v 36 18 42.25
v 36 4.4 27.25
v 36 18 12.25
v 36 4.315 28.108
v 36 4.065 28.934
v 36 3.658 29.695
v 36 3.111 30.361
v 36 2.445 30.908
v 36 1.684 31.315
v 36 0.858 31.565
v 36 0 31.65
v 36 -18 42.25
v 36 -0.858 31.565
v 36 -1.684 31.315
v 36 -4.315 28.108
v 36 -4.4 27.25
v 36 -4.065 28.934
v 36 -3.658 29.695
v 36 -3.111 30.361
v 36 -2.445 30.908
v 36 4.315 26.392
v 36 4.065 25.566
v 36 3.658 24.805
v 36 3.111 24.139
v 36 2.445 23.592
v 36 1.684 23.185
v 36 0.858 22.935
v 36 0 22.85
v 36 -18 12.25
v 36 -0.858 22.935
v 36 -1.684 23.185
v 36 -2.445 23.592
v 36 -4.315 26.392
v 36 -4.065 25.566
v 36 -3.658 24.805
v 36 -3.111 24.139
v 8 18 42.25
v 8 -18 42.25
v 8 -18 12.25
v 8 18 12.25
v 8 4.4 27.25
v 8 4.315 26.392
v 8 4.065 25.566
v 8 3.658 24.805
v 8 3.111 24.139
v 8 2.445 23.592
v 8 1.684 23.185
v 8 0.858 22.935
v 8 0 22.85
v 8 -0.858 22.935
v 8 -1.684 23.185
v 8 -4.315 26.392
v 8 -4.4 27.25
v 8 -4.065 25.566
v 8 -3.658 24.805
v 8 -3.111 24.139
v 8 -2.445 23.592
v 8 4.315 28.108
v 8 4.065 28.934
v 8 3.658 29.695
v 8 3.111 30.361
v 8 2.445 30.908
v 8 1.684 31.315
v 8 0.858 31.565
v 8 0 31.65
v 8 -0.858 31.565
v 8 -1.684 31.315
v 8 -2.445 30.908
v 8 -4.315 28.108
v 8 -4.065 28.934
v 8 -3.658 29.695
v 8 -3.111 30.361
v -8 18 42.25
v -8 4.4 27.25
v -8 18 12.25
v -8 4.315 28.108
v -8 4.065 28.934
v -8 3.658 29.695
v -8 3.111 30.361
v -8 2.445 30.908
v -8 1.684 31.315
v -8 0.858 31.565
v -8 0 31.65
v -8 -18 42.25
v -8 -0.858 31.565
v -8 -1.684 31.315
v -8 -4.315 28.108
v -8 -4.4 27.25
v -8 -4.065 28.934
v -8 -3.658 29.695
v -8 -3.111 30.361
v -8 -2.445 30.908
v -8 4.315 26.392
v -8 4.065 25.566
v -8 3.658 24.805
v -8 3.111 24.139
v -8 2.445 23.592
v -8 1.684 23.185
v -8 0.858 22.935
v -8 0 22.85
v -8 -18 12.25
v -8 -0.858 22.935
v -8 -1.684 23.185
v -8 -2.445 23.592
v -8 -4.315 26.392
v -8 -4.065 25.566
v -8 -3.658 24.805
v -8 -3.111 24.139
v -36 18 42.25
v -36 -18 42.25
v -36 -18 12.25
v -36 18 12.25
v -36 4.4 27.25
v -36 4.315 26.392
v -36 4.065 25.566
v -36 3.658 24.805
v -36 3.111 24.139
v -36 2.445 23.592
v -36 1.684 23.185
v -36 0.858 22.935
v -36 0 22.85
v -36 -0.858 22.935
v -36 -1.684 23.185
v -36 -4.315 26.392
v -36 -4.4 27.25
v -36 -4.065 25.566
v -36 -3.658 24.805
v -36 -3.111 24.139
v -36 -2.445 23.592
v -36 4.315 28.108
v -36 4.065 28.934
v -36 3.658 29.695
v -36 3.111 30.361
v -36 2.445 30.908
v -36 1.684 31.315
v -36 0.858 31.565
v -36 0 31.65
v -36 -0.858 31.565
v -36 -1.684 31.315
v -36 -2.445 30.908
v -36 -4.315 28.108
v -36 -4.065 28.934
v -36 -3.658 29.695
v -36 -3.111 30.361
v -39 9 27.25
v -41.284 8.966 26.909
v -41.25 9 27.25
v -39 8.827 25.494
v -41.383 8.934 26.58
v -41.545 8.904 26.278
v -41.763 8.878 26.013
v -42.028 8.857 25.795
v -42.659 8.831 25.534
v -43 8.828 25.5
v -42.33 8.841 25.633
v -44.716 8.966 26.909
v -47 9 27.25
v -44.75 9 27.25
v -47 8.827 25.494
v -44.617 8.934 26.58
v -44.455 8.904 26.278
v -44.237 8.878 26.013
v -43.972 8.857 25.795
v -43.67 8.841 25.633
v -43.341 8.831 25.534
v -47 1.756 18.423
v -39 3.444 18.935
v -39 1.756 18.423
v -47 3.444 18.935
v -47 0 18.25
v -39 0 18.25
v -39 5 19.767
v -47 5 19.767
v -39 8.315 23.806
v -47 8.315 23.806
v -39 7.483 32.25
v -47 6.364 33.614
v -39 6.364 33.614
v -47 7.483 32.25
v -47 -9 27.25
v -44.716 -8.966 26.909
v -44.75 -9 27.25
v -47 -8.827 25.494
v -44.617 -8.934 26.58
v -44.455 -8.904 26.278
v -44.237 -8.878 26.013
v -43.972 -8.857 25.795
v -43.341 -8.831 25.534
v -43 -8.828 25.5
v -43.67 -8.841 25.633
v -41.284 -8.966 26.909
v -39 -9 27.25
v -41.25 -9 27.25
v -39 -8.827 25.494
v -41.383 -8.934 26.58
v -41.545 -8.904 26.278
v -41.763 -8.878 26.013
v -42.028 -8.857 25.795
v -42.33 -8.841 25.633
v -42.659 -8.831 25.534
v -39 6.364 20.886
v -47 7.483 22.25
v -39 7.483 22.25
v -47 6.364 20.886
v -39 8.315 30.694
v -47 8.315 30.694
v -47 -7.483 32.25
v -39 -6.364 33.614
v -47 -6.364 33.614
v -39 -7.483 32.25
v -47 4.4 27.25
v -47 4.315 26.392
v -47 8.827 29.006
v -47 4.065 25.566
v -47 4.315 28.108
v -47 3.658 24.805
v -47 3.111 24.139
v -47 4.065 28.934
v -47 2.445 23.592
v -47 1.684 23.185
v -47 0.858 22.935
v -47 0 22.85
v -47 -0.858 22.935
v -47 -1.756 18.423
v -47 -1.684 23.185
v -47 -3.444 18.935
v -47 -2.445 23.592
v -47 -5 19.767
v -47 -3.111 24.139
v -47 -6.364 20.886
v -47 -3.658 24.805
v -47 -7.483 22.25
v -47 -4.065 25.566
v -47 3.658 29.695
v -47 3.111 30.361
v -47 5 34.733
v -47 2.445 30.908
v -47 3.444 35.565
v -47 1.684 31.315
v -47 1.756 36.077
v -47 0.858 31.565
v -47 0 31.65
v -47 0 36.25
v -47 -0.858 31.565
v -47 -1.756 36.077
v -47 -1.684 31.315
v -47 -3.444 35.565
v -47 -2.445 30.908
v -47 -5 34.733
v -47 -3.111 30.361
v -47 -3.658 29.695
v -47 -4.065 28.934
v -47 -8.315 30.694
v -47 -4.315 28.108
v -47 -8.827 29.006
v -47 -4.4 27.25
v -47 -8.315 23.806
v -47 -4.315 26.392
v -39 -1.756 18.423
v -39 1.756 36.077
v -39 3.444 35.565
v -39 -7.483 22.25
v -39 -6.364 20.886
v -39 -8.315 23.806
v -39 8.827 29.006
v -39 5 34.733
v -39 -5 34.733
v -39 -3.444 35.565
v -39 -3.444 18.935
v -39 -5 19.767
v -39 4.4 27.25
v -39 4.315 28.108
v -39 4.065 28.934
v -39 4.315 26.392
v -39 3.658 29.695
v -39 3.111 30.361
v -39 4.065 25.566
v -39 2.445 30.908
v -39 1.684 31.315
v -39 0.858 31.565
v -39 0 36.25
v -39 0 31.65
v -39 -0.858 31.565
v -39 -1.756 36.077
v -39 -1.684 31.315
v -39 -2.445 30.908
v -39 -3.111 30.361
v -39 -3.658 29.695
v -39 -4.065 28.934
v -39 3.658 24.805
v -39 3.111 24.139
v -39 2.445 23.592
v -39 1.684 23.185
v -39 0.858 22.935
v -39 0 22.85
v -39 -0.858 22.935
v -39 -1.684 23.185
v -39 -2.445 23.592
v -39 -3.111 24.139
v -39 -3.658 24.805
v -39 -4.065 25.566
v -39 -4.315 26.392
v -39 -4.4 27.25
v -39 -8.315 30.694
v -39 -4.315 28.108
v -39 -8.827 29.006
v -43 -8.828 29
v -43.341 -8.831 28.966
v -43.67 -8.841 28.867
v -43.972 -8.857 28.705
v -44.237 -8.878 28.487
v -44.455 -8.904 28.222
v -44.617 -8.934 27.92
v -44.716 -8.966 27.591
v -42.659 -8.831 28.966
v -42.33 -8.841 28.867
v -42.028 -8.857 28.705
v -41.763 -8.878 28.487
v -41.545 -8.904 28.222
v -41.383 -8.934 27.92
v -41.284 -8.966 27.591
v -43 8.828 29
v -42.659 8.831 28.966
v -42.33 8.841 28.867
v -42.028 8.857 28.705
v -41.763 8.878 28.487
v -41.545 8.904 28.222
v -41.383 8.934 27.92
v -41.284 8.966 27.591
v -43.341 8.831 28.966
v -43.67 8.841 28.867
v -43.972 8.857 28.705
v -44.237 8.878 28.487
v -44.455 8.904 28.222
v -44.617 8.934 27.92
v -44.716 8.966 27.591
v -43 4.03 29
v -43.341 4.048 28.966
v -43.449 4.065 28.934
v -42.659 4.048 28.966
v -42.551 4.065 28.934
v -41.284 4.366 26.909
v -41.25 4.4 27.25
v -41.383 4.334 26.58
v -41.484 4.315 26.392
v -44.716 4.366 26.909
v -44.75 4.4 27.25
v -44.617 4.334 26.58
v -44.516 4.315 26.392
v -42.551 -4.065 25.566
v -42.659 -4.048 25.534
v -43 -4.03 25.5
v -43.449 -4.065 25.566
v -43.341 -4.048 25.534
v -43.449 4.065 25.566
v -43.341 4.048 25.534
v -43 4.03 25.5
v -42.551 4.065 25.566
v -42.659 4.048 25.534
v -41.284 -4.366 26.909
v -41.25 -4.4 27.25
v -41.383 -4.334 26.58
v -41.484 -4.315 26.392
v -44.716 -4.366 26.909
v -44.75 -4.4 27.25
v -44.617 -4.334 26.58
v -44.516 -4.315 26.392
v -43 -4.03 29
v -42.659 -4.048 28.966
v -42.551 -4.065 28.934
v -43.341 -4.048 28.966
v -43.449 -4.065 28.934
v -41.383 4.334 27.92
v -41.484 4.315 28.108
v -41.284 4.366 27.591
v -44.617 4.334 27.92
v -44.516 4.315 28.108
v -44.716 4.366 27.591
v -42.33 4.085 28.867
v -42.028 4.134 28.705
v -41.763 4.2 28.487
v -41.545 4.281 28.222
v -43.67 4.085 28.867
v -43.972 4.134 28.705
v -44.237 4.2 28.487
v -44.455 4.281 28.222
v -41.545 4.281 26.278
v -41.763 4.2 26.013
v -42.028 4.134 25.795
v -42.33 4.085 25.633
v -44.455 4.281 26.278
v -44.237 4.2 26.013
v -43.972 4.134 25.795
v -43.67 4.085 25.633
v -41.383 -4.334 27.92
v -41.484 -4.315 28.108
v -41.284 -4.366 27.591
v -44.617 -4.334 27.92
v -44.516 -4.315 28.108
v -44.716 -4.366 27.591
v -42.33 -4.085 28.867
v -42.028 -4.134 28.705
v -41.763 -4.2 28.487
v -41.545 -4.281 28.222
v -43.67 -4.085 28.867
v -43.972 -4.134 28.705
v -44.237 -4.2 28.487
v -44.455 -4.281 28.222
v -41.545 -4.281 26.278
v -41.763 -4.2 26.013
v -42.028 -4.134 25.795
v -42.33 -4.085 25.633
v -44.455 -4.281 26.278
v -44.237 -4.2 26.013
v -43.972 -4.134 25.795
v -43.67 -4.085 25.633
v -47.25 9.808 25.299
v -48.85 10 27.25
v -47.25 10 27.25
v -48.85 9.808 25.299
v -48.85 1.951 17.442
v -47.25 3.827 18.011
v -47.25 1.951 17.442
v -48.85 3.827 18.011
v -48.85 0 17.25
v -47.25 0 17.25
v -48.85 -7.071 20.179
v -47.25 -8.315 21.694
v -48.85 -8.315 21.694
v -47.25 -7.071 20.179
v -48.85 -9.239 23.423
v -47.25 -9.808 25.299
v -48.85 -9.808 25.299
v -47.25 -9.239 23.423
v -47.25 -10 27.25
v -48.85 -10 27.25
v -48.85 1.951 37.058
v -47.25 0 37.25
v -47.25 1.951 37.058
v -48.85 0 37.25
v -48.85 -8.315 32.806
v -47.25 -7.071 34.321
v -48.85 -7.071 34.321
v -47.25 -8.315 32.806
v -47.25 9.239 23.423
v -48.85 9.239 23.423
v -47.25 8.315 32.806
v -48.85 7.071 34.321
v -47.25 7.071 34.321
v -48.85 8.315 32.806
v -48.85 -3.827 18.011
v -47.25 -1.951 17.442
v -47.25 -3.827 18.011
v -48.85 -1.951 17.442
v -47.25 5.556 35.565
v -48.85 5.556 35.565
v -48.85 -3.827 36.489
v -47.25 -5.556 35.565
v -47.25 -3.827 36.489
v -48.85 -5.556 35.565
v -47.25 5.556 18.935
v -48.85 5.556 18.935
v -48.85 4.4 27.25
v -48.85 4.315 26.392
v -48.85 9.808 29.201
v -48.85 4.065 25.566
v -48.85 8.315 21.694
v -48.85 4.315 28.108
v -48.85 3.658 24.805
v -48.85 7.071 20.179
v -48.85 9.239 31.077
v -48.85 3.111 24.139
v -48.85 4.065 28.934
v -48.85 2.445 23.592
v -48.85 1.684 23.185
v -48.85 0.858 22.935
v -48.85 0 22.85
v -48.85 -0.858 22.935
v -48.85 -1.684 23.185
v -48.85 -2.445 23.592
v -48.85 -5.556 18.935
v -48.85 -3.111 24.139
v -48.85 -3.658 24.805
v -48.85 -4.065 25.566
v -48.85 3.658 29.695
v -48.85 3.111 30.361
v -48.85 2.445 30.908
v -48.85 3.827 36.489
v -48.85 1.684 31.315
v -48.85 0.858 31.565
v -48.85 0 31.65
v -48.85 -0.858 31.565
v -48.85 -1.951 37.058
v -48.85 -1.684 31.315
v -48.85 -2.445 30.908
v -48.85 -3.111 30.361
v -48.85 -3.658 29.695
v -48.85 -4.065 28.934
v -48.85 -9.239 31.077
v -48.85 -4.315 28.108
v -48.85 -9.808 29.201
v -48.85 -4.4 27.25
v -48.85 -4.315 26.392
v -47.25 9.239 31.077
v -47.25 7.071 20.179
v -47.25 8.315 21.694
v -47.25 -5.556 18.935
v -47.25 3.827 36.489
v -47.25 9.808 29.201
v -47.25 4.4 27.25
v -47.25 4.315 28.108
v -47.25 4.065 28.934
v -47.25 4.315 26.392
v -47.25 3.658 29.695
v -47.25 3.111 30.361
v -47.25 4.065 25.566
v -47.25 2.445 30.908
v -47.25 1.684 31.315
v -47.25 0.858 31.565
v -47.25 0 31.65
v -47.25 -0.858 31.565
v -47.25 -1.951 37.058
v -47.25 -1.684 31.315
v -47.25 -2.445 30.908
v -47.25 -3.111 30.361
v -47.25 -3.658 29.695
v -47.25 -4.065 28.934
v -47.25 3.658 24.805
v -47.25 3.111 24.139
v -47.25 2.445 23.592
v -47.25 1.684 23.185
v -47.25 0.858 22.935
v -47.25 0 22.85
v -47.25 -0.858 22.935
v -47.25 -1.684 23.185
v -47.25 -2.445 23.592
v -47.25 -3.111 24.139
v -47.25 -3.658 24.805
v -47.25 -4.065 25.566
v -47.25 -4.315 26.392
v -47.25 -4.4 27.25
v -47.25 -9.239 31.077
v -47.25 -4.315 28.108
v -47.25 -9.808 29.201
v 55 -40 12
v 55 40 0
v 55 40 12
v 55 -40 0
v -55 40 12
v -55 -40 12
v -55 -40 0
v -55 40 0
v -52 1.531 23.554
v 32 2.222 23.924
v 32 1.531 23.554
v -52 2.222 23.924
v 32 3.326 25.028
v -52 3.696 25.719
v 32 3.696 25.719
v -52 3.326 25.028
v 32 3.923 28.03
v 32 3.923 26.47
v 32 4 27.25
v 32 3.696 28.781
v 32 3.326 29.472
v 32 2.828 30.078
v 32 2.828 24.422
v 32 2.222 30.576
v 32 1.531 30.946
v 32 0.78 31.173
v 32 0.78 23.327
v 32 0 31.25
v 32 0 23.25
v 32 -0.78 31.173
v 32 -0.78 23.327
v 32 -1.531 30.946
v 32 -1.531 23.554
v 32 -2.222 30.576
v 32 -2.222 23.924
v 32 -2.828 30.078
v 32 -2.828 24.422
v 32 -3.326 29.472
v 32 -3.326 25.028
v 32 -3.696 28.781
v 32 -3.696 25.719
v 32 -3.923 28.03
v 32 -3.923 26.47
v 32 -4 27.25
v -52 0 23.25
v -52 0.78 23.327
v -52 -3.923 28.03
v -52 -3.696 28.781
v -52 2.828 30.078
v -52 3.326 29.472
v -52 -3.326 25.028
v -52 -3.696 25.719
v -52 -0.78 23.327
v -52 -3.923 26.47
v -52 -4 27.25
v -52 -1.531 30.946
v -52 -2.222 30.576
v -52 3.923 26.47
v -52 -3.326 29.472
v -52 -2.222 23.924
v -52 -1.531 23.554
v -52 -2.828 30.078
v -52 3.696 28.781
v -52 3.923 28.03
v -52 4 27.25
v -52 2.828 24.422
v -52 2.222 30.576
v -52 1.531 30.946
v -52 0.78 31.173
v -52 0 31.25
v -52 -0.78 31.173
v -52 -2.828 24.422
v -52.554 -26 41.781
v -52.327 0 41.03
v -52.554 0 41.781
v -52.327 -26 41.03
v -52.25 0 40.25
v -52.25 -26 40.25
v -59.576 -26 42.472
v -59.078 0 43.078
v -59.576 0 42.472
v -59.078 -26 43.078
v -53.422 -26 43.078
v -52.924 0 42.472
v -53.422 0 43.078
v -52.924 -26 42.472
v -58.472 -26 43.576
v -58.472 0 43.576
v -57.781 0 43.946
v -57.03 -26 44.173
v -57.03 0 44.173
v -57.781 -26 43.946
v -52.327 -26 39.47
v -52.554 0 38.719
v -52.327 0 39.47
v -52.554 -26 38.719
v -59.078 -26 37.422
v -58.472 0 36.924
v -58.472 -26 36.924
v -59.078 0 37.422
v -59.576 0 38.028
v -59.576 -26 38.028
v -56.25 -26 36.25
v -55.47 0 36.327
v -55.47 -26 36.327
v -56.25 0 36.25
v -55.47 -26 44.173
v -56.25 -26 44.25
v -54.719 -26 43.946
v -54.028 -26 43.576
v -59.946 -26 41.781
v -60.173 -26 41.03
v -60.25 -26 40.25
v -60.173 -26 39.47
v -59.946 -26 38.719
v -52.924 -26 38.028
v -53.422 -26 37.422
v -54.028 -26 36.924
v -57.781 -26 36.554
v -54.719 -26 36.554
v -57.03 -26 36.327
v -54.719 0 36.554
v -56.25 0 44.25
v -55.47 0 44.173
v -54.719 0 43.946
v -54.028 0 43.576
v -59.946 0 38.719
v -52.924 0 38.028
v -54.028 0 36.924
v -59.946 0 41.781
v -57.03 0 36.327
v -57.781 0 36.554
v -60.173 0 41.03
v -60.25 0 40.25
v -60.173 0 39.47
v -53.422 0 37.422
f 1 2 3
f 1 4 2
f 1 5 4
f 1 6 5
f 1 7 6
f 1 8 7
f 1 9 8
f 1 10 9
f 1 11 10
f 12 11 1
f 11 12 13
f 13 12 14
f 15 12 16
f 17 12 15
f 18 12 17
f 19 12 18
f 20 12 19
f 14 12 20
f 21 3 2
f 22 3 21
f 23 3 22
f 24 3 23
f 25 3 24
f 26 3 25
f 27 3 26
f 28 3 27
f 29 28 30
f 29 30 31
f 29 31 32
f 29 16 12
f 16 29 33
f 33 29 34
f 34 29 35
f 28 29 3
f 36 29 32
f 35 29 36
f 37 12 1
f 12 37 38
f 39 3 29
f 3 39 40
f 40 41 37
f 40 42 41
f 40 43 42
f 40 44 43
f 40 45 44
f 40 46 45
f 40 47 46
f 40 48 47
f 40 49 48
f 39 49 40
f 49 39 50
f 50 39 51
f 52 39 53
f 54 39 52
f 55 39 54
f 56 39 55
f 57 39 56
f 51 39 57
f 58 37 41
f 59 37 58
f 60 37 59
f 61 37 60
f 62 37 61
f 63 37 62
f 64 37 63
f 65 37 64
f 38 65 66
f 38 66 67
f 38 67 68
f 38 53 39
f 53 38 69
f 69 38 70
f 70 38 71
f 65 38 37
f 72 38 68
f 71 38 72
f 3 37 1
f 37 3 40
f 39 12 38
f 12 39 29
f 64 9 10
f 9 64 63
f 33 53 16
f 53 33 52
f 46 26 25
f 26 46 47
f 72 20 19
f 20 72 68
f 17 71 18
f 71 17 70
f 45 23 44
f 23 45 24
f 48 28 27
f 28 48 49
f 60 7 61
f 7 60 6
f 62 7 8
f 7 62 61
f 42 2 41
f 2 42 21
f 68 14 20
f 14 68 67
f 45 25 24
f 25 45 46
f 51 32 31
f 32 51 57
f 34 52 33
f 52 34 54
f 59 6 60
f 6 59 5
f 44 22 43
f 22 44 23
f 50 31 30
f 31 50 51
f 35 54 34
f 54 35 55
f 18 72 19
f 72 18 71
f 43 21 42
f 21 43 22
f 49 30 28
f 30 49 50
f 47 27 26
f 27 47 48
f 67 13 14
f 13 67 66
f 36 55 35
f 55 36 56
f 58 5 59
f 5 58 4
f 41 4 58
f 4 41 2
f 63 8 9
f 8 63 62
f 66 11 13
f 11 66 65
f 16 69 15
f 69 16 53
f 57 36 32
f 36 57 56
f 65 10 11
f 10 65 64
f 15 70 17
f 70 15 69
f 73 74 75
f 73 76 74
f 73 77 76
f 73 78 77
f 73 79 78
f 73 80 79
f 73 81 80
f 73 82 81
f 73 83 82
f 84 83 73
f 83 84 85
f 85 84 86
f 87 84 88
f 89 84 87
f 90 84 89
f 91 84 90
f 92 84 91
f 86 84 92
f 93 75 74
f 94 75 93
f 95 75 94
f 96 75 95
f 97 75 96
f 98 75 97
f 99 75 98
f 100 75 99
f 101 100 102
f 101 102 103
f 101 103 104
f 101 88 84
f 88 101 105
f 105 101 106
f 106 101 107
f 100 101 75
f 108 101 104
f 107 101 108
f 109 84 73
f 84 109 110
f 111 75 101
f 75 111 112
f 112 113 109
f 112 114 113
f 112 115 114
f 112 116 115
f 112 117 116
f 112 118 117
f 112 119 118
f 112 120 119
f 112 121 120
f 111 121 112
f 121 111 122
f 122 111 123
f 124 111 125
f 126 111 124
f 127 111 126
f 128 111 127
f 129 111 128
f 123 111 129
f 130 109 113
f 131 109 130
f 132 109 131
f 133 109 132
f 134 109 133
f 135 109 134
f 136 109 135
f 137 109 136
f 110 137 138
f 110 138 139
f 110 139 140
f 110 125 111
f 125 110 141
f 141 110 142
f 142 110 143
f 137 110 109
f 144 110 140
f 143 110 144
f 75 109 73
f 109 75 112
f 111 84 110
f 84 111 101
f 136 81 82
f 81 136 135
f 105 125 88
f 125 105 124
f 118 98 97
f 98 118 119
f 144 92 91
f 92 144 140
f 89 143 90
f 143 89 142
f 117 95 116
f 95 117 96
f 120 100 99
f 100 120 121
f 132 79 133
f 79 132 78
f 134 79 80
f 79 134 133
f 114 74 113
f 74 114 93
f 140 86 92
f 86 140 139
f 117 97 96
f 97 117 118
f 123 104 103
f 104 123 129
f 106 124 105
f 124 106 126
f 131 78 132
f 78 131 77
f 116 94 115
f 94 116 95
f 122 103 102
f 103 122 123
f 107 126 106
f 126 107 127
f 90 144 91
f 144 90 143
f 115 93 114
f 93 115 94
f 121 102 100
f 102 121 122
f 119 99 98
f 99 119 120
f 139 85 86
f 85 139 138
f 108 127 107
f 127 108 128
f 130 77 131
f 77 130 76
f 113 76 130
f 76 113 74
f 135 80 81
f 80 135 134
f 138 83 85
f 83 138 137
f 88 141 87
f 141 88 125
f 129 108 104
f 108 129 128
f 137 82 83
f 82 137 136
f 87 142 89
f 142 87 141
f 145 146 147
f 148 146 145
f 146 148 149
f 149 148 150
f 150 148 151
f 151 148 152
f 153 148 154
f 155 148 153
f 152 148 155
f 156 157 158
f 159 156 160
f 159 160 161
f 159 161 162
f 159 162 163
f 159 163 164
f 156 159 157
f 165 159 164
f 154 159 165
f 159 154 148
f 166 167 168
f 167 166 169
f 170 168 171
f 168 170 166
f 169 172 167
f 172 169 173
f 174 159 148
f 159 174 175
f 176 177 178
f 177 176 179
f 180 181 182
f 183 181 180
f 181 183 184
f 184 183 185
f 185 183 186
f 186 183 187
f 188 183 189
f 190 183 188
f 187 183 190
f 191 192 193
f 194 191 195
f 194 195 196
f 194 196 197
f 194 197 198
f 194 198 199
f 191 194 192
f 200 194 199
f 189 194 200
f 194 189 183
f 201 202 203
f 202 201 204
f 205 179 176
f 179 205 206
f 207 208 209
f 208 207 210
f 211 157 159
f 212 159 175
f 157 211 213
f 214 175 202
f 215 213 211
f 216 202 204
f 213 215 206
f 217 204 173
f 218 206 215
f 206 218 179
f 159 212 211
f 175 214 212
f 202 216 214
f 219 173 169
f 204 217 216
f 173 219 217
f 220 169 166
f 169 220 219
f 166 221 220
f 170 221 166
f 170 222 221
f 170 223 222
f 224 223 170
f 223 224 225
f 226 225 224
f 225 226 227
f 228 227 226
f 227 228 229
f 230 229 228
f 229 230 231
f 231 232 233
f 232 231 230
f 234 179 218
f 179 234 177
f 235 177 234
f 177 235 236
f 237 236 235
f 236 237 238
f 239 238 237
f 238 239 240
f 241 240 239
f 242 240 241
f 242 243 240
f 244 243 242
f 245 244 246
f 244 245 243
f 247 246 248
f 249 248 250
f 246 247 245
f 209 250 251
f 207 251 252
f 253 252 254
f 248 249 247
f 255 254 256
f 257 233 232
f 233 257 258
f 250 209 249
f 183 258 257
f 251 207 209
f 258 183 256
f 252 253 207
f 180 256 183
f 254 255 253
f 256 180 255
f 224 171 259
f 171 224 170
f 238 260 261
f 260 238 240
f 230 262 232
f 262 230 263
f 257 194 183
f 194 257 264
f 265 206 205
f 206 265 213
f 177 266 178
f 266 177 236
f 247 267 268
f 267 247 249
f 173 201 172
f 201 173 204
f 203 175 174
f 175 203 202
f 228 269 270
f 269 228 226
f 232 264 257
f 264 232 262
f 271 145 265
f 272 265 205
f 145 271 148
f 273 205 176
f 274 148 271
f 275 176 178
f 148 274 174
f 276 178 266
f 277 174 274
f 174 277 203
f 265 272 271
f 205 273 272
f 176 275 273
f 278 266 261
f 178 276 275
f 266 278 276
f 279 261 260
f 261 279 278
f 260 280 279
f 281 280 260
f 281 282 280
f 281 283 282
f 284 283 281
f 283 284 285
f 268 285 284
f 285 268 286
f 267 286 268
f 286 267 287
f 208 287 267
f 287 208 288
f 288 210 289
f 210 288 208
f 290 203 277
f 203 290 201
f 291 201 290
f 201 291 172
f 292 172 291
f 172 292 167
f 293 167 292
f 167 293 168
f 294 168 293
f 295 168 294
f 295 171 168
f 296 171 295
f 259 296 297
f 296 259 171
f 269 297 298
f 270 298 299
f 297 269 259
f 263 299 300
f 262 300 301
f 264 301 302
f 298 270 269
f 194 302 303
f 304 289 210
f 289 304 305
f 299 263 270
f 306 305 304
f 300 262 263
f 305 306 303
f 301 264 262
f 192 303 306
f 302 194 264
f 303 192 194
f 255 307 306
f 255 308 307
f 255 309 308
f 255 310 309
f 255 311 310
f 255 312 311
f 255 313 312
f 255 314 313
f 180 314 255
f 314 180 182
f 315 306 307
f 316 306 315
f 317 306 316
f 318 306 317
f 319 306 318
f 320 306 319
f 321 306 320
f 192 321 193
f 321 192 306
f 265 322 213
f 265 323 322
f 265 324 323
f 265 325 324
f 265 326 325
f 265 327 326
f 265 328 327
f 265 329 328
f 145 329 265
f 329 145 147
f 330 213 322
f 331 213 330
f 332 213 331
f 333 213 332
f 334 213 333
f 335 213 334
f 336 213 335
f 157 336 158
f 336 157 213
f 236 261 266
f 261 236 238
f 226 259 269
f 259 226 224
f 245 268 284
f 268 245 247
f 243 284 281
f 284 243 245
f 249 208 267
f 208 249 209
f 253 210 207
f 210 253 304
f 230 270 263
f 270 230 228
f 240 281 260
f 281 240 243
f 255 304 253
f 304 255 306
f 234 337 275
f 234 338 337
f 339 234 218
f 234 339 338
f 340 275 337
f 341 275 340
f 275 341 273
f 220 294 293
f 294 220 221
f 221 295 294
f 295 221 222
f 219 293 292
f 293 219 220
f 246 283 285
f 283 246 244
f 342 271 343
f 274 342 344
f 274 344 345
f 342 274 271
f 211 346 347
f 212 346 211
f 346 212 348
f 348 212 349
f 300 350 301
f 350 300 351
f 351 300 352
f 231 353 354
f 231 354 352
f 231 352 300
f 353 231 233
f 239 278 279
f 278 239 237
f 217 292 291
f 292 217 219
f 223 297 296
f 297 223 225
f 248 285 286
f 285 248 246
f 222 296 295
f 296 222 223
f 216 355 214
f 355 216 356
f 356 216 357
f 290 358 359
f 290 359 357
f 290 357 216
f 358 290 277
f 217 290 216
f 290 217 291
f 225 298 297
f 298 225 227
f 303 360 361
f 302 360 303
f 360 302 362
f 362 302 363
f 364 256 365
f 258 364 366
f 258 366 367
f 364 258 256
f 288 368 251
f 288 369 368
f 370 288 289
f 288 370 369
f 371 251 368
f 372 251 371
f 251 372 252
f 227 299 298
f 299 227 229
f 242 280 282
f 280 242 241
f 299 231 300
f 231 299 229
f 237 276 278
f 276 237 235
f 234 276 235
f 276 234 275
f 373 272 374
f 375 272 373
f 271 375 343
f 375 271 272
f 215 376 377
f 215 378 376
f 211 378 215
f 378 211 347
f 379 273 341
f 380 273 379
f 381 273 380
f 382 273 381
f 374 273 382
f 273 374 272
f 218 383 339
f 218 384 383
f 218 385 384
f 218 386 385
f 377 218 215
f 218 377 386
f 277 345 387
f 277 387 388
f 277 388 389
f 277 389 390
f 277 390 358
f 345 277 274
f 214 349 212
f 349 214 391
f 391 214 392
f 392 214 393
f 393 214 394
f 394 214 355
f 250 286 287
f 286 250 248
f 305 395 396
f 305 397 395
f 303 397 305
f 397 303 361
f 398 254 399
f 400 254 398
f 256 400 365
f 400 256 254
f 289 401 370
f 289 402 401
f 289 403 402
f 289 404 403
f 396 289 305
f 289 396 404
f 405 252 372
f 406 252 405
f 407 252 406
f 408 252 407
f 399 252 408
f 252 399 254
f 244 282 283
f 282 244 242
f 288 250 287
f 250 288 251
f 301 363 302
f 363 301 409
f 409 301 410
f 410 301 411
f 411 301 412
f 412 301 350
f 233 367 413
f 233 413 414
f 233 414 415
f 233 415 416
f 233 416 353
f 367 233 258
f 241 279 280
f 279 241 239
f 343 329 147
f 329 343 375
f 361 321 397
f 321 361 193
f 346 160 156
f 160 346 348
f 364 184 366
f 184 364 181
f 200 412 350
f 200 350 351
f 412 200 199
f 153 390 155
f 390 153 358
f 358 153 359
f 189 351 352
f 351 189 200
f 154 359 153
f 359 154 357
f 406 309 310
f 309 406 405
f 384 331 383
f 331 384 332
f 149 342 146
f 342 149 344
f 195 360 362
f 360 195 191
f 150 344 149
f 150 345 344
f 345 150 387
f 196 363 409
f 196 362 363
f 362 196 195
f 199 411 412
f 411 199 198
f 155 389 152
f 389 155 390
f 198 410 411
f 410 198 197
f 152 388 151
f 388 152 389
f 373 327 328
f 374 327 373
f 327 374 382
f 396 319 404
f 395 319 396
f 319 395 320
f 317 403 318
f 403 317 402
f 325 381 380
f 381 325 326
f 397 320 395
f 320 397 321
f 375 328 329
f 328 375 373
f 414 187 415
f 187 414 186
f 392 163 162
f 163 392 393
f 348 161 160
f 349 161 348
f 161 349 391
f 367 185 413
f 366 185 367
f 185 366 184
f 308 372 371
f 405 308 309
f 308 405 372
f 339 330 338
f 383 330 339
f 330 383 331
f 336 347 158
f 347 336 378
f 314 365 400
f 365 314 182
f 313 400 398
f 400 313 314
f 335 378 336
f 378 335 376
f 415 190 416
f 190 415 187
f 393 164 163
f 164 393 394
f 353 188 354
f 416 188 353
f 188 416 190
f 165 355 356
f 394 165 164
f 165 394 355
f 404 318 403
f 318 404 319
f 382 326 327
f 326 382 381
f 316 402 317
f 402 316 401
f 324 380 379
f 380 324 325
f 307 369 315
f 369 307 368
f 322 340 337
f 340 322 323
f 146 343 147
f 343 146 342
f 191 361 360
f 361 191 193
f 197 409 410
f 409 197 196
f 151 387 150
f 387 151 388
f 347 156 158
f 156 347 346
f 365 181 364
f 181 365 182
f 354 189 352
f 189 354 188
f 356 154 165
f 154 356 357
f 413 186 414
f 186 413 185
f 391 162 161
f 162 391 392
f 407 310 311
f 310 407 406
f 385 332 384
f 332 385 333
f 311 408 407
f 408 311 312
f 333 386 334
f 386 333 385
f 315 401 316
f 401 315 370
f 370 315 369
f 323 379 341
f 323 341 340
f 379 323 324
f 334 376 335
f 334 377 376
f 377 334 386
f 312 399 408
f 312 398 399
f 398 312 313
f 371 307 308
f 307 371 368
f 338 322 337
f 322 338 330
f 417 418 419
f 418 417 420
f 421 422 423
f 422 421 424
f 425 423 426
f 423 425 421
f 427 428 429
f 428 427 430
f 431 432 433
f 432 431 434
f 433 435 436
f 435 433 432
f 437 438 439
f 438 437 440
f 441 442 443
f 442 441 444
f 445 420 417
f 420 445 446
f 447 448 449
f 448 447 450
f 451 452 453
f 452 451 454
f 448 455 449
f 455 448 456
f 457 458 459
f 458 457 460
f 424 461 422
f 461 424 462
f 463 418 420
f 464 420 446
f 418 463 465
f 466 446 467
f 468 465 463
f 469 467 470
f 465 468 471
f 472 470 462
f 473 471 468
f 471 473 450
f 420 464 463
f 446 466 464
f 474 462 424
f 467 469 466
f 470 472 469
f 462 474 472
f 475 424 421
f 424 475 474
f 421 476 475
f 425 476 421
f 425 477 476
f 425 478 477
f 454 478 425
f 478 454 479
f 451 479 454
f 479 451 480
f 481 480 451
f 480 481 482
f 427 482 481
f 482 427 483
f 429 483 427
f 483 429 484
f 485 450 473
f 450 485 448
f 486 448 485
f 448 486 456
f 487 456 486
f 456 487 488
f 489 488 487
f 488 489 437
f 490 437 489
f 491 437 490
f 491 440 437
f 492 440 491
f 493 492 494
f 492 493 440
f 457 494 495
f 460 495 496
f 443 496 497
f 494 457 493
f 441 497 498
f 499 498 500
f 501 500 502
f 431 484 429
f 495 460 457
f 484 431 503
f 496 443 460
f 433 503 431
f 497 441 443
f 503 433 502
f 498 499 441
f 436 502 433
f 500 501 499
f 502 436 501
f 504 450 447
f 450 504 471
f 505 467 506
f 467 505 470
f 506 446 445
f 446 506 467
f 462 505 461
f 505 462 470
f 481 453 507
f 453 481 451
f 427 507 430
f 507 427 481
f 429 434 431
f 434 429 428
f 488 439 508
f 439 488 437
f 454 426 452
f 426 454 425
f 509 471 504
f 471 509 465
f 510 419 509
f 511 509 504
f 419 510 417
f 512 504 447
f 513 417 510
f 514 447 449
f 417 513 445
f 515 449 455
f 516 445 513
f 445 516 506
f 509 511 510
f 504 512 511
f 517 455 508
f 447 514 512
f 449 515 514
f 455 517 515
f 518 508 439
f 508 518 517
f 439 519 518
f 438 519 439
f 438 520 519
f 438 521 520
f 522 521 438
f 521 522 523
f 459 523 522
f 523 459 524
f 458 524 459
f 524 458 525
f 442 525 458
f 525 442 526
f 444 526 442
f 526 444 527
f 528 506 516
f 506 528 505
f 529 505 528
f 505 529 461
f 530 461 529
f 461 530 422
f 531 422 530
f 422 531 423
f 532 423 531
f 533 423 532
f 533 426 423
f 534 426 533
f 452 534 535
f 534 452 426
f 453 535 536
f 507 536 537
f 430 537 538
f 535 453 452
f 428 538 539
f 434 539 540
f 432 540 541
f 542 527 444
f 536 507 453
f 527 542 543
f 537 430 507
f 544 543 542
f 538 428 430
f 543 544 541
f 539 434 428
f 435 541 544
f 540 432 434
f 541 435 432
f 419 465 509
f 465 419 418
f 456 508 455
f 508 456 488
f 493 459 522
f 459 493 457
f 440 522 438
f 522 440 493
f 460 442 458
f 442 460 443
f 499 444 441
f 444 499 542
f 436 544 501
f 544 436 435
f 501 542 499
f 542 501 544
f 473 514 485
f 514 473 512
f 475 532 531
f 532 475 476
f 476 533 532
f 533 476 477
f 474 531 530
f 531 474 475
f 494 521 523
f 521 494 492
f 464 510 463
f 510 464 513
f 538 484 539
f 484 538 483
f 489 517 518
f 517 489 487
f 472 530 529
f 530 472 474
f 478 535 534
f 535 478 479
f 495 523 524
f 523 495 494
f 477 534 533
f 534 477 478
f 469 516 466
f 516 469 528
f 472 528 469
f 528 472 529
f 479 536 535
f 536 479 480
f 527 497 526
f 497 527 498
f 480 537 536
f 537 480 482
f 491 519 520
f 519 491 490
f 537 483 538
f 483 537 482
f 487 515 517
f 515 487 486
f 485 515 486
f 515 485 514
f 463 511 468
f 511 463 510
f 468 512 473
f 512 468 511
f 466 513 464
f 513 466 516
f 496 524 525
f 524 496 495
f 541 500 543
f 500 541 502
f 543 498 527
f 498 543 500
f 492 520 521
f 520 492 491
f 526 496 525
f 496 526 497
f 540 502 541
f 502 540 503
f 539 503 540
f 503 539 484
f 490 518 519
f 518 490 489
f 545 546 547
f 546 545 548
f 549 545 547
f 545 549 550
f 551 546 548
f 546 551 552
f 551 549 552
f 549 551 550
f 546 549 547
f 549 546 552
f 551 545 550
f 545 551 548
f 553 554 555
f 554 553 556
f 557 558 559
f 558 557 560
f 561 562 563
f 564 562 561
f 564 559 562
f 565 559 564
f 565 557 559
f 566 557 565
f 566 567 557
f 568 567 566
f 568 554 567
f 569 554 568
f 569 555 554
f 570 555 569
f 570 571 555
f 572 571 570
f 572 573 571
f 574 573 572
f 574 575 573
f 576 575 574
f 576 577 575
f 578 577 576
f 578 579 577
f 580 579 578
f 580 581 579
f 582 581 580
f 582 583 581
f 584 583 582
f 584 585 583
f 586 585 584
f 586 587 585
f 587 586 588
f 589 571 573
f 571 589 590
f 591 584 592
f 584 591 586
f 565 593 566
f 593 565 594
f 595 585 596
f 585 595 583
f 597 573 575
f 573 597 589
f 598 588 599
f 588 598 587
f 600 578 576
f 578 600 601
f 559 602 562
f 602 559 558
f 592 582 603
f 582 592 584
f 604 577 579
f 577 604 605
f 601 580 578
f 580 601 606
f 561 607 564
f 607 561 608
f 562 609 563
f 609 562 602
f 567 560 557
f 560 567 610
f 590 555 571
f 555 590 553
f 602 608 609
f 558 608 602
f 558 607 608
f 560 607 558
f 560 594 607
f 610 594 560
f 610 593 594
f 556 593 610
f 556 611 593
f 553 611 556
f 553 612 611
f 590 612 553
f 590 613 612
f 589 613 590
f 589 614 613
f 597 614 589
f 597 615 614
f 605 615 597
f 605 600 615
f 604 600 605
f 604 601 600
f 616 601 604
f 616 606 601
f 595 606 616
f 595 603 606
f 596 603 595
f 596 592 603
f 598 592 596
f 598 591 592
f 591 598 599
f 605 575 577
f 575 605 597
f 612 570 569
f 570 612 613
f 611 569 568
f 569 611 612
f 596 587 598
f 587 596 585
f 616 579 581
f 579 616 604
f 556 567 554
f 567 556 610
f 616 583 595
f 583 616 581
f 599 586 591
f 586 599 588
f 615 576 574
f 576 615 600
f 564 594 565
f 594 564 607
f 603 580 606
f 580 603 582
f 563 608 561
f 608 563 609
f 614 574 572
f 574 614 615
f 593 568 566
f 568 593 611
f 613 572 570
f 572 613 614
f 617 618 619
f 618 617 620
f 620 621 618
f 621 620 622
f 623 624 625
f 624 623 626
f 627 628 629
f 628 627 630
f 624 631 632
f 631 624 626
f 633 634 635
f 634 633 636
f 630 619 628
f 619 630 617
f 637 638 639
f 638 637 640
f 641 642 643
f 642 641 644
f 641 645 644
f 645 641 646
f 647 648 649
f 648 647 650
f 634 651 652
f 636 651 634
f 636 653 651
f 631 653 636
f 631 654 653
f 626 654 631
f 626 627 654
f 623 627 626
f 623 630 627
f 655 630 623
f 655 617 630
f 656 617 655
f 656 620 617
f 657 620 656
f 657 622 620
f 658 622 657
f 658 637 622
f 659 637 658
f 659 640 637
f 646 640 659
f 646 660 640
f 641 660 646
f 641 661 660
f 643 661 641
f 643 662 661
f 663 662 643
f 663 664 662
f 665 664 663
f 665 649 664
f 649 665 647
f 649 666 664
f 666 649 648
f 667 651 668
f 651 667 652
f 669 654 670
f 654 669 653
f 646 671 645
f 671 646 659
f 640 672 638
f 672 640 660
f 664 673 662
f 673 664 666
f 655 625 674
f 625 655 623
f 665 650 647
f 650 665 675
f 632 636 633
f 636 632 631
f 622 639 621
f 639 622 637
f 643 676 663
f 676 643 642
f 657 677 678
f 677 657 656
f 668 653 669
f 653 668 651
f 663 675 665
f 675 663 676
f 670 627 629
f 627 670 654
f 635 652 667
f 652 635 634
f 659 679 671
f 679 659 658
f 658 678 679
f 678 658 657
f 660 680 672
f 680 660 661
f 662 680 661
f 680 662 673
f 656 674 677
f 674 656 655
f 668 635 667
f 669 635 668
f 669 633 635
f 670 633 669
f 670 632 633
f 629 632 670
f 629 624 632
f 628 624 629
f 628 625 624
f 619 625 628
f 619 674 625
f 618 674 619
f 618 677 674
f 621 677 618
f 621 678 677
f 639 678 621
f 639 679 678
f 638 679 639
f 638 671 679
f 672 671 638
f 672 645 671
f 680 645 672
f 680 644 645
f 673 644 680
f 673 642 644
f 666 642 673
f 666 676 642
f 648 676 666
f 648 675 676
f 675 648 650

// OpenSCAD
$fn = 32;

// ------------------------------------------------------------------------
// Machine vise: screw d8, jaws 28 x 30 mm
// Every part is its own module, assembly() places every instance.
// ------------------------------------------------------------------------

// --- part 1 ---
module vise_bed() {
  difference() {
    translate([-55, -40, 0]) cube([110, 80, 12]);
  }
}

// --- part 2 ---
module vise_jaw() {
  difference() {
    translate([-14, -18, 0]) cube([28, 36, 30]);
    translate([0, 0, 15]) rotate([0, 90, 0]) cylinder(h = 30, d = 8.8, center = true);
  }
}

// --- part 3 ---
module vise_screw() {
  translate([0, 0, -42]) cylinder(h = 84, d = 8);
}

// --- part 4 ---
module screw_collar() {
  difference() {
    cylinder(h = 8, d = 18);
    translate([0, 0, -1]) cylinder(h = 10, d = 8.8);
    translate([0, 0, 4]) rotate([90, 0, 0]) cylinder(h = 20, d = 3.5, center = true);
  }
}

// --- part 5 ---
module screw_washer() {
  difference() {
      translate([0, 0, 0]) cylinder(h = 1.6, d = 20);
      translate([0, 0, -1]) cylinder(h = 3.6, d = 8.8);
    }
}

// --- part 6 ---
module vise_handle() {
  cylinder(h = 26, d = 8);
}

// --- assembly ---
module assembly() {
  color([0.80, 0.24, 0.20]) translate([0, 0, 0]) rotate([0, 0, 0]) vise_bed();
  color([0.20, 0.45, 0.75]) translate([22, 0, 12.25]) rotate([0, 0, 0]) vise_jaw();
  color([0.25, 0.62, 0.32]) translate([-22, 0, 12.25]) rotate([0, 0, 0]) vise_jaw();
  color([0.92, 0.70, 0.18]) translate([-10, 0, 27.25]) rotate([0, 90, 0]) vise_screw();
  color([0.58, 0.35, 0.70]) translate([-47, 0, 27.25]) rotate([0, 90, 0]) screw_collar();
  color([0.16, 0.66, 0.66]) translate([-48.85, 0, 27.25]) rotate([0, 90, 0]) screw_washer();
  color([0.85, 0.48, 0.18]) translate([-56.25, 0, 40.25]) rotate([90, 0, 0]) vise_handle();
}

assembly();
